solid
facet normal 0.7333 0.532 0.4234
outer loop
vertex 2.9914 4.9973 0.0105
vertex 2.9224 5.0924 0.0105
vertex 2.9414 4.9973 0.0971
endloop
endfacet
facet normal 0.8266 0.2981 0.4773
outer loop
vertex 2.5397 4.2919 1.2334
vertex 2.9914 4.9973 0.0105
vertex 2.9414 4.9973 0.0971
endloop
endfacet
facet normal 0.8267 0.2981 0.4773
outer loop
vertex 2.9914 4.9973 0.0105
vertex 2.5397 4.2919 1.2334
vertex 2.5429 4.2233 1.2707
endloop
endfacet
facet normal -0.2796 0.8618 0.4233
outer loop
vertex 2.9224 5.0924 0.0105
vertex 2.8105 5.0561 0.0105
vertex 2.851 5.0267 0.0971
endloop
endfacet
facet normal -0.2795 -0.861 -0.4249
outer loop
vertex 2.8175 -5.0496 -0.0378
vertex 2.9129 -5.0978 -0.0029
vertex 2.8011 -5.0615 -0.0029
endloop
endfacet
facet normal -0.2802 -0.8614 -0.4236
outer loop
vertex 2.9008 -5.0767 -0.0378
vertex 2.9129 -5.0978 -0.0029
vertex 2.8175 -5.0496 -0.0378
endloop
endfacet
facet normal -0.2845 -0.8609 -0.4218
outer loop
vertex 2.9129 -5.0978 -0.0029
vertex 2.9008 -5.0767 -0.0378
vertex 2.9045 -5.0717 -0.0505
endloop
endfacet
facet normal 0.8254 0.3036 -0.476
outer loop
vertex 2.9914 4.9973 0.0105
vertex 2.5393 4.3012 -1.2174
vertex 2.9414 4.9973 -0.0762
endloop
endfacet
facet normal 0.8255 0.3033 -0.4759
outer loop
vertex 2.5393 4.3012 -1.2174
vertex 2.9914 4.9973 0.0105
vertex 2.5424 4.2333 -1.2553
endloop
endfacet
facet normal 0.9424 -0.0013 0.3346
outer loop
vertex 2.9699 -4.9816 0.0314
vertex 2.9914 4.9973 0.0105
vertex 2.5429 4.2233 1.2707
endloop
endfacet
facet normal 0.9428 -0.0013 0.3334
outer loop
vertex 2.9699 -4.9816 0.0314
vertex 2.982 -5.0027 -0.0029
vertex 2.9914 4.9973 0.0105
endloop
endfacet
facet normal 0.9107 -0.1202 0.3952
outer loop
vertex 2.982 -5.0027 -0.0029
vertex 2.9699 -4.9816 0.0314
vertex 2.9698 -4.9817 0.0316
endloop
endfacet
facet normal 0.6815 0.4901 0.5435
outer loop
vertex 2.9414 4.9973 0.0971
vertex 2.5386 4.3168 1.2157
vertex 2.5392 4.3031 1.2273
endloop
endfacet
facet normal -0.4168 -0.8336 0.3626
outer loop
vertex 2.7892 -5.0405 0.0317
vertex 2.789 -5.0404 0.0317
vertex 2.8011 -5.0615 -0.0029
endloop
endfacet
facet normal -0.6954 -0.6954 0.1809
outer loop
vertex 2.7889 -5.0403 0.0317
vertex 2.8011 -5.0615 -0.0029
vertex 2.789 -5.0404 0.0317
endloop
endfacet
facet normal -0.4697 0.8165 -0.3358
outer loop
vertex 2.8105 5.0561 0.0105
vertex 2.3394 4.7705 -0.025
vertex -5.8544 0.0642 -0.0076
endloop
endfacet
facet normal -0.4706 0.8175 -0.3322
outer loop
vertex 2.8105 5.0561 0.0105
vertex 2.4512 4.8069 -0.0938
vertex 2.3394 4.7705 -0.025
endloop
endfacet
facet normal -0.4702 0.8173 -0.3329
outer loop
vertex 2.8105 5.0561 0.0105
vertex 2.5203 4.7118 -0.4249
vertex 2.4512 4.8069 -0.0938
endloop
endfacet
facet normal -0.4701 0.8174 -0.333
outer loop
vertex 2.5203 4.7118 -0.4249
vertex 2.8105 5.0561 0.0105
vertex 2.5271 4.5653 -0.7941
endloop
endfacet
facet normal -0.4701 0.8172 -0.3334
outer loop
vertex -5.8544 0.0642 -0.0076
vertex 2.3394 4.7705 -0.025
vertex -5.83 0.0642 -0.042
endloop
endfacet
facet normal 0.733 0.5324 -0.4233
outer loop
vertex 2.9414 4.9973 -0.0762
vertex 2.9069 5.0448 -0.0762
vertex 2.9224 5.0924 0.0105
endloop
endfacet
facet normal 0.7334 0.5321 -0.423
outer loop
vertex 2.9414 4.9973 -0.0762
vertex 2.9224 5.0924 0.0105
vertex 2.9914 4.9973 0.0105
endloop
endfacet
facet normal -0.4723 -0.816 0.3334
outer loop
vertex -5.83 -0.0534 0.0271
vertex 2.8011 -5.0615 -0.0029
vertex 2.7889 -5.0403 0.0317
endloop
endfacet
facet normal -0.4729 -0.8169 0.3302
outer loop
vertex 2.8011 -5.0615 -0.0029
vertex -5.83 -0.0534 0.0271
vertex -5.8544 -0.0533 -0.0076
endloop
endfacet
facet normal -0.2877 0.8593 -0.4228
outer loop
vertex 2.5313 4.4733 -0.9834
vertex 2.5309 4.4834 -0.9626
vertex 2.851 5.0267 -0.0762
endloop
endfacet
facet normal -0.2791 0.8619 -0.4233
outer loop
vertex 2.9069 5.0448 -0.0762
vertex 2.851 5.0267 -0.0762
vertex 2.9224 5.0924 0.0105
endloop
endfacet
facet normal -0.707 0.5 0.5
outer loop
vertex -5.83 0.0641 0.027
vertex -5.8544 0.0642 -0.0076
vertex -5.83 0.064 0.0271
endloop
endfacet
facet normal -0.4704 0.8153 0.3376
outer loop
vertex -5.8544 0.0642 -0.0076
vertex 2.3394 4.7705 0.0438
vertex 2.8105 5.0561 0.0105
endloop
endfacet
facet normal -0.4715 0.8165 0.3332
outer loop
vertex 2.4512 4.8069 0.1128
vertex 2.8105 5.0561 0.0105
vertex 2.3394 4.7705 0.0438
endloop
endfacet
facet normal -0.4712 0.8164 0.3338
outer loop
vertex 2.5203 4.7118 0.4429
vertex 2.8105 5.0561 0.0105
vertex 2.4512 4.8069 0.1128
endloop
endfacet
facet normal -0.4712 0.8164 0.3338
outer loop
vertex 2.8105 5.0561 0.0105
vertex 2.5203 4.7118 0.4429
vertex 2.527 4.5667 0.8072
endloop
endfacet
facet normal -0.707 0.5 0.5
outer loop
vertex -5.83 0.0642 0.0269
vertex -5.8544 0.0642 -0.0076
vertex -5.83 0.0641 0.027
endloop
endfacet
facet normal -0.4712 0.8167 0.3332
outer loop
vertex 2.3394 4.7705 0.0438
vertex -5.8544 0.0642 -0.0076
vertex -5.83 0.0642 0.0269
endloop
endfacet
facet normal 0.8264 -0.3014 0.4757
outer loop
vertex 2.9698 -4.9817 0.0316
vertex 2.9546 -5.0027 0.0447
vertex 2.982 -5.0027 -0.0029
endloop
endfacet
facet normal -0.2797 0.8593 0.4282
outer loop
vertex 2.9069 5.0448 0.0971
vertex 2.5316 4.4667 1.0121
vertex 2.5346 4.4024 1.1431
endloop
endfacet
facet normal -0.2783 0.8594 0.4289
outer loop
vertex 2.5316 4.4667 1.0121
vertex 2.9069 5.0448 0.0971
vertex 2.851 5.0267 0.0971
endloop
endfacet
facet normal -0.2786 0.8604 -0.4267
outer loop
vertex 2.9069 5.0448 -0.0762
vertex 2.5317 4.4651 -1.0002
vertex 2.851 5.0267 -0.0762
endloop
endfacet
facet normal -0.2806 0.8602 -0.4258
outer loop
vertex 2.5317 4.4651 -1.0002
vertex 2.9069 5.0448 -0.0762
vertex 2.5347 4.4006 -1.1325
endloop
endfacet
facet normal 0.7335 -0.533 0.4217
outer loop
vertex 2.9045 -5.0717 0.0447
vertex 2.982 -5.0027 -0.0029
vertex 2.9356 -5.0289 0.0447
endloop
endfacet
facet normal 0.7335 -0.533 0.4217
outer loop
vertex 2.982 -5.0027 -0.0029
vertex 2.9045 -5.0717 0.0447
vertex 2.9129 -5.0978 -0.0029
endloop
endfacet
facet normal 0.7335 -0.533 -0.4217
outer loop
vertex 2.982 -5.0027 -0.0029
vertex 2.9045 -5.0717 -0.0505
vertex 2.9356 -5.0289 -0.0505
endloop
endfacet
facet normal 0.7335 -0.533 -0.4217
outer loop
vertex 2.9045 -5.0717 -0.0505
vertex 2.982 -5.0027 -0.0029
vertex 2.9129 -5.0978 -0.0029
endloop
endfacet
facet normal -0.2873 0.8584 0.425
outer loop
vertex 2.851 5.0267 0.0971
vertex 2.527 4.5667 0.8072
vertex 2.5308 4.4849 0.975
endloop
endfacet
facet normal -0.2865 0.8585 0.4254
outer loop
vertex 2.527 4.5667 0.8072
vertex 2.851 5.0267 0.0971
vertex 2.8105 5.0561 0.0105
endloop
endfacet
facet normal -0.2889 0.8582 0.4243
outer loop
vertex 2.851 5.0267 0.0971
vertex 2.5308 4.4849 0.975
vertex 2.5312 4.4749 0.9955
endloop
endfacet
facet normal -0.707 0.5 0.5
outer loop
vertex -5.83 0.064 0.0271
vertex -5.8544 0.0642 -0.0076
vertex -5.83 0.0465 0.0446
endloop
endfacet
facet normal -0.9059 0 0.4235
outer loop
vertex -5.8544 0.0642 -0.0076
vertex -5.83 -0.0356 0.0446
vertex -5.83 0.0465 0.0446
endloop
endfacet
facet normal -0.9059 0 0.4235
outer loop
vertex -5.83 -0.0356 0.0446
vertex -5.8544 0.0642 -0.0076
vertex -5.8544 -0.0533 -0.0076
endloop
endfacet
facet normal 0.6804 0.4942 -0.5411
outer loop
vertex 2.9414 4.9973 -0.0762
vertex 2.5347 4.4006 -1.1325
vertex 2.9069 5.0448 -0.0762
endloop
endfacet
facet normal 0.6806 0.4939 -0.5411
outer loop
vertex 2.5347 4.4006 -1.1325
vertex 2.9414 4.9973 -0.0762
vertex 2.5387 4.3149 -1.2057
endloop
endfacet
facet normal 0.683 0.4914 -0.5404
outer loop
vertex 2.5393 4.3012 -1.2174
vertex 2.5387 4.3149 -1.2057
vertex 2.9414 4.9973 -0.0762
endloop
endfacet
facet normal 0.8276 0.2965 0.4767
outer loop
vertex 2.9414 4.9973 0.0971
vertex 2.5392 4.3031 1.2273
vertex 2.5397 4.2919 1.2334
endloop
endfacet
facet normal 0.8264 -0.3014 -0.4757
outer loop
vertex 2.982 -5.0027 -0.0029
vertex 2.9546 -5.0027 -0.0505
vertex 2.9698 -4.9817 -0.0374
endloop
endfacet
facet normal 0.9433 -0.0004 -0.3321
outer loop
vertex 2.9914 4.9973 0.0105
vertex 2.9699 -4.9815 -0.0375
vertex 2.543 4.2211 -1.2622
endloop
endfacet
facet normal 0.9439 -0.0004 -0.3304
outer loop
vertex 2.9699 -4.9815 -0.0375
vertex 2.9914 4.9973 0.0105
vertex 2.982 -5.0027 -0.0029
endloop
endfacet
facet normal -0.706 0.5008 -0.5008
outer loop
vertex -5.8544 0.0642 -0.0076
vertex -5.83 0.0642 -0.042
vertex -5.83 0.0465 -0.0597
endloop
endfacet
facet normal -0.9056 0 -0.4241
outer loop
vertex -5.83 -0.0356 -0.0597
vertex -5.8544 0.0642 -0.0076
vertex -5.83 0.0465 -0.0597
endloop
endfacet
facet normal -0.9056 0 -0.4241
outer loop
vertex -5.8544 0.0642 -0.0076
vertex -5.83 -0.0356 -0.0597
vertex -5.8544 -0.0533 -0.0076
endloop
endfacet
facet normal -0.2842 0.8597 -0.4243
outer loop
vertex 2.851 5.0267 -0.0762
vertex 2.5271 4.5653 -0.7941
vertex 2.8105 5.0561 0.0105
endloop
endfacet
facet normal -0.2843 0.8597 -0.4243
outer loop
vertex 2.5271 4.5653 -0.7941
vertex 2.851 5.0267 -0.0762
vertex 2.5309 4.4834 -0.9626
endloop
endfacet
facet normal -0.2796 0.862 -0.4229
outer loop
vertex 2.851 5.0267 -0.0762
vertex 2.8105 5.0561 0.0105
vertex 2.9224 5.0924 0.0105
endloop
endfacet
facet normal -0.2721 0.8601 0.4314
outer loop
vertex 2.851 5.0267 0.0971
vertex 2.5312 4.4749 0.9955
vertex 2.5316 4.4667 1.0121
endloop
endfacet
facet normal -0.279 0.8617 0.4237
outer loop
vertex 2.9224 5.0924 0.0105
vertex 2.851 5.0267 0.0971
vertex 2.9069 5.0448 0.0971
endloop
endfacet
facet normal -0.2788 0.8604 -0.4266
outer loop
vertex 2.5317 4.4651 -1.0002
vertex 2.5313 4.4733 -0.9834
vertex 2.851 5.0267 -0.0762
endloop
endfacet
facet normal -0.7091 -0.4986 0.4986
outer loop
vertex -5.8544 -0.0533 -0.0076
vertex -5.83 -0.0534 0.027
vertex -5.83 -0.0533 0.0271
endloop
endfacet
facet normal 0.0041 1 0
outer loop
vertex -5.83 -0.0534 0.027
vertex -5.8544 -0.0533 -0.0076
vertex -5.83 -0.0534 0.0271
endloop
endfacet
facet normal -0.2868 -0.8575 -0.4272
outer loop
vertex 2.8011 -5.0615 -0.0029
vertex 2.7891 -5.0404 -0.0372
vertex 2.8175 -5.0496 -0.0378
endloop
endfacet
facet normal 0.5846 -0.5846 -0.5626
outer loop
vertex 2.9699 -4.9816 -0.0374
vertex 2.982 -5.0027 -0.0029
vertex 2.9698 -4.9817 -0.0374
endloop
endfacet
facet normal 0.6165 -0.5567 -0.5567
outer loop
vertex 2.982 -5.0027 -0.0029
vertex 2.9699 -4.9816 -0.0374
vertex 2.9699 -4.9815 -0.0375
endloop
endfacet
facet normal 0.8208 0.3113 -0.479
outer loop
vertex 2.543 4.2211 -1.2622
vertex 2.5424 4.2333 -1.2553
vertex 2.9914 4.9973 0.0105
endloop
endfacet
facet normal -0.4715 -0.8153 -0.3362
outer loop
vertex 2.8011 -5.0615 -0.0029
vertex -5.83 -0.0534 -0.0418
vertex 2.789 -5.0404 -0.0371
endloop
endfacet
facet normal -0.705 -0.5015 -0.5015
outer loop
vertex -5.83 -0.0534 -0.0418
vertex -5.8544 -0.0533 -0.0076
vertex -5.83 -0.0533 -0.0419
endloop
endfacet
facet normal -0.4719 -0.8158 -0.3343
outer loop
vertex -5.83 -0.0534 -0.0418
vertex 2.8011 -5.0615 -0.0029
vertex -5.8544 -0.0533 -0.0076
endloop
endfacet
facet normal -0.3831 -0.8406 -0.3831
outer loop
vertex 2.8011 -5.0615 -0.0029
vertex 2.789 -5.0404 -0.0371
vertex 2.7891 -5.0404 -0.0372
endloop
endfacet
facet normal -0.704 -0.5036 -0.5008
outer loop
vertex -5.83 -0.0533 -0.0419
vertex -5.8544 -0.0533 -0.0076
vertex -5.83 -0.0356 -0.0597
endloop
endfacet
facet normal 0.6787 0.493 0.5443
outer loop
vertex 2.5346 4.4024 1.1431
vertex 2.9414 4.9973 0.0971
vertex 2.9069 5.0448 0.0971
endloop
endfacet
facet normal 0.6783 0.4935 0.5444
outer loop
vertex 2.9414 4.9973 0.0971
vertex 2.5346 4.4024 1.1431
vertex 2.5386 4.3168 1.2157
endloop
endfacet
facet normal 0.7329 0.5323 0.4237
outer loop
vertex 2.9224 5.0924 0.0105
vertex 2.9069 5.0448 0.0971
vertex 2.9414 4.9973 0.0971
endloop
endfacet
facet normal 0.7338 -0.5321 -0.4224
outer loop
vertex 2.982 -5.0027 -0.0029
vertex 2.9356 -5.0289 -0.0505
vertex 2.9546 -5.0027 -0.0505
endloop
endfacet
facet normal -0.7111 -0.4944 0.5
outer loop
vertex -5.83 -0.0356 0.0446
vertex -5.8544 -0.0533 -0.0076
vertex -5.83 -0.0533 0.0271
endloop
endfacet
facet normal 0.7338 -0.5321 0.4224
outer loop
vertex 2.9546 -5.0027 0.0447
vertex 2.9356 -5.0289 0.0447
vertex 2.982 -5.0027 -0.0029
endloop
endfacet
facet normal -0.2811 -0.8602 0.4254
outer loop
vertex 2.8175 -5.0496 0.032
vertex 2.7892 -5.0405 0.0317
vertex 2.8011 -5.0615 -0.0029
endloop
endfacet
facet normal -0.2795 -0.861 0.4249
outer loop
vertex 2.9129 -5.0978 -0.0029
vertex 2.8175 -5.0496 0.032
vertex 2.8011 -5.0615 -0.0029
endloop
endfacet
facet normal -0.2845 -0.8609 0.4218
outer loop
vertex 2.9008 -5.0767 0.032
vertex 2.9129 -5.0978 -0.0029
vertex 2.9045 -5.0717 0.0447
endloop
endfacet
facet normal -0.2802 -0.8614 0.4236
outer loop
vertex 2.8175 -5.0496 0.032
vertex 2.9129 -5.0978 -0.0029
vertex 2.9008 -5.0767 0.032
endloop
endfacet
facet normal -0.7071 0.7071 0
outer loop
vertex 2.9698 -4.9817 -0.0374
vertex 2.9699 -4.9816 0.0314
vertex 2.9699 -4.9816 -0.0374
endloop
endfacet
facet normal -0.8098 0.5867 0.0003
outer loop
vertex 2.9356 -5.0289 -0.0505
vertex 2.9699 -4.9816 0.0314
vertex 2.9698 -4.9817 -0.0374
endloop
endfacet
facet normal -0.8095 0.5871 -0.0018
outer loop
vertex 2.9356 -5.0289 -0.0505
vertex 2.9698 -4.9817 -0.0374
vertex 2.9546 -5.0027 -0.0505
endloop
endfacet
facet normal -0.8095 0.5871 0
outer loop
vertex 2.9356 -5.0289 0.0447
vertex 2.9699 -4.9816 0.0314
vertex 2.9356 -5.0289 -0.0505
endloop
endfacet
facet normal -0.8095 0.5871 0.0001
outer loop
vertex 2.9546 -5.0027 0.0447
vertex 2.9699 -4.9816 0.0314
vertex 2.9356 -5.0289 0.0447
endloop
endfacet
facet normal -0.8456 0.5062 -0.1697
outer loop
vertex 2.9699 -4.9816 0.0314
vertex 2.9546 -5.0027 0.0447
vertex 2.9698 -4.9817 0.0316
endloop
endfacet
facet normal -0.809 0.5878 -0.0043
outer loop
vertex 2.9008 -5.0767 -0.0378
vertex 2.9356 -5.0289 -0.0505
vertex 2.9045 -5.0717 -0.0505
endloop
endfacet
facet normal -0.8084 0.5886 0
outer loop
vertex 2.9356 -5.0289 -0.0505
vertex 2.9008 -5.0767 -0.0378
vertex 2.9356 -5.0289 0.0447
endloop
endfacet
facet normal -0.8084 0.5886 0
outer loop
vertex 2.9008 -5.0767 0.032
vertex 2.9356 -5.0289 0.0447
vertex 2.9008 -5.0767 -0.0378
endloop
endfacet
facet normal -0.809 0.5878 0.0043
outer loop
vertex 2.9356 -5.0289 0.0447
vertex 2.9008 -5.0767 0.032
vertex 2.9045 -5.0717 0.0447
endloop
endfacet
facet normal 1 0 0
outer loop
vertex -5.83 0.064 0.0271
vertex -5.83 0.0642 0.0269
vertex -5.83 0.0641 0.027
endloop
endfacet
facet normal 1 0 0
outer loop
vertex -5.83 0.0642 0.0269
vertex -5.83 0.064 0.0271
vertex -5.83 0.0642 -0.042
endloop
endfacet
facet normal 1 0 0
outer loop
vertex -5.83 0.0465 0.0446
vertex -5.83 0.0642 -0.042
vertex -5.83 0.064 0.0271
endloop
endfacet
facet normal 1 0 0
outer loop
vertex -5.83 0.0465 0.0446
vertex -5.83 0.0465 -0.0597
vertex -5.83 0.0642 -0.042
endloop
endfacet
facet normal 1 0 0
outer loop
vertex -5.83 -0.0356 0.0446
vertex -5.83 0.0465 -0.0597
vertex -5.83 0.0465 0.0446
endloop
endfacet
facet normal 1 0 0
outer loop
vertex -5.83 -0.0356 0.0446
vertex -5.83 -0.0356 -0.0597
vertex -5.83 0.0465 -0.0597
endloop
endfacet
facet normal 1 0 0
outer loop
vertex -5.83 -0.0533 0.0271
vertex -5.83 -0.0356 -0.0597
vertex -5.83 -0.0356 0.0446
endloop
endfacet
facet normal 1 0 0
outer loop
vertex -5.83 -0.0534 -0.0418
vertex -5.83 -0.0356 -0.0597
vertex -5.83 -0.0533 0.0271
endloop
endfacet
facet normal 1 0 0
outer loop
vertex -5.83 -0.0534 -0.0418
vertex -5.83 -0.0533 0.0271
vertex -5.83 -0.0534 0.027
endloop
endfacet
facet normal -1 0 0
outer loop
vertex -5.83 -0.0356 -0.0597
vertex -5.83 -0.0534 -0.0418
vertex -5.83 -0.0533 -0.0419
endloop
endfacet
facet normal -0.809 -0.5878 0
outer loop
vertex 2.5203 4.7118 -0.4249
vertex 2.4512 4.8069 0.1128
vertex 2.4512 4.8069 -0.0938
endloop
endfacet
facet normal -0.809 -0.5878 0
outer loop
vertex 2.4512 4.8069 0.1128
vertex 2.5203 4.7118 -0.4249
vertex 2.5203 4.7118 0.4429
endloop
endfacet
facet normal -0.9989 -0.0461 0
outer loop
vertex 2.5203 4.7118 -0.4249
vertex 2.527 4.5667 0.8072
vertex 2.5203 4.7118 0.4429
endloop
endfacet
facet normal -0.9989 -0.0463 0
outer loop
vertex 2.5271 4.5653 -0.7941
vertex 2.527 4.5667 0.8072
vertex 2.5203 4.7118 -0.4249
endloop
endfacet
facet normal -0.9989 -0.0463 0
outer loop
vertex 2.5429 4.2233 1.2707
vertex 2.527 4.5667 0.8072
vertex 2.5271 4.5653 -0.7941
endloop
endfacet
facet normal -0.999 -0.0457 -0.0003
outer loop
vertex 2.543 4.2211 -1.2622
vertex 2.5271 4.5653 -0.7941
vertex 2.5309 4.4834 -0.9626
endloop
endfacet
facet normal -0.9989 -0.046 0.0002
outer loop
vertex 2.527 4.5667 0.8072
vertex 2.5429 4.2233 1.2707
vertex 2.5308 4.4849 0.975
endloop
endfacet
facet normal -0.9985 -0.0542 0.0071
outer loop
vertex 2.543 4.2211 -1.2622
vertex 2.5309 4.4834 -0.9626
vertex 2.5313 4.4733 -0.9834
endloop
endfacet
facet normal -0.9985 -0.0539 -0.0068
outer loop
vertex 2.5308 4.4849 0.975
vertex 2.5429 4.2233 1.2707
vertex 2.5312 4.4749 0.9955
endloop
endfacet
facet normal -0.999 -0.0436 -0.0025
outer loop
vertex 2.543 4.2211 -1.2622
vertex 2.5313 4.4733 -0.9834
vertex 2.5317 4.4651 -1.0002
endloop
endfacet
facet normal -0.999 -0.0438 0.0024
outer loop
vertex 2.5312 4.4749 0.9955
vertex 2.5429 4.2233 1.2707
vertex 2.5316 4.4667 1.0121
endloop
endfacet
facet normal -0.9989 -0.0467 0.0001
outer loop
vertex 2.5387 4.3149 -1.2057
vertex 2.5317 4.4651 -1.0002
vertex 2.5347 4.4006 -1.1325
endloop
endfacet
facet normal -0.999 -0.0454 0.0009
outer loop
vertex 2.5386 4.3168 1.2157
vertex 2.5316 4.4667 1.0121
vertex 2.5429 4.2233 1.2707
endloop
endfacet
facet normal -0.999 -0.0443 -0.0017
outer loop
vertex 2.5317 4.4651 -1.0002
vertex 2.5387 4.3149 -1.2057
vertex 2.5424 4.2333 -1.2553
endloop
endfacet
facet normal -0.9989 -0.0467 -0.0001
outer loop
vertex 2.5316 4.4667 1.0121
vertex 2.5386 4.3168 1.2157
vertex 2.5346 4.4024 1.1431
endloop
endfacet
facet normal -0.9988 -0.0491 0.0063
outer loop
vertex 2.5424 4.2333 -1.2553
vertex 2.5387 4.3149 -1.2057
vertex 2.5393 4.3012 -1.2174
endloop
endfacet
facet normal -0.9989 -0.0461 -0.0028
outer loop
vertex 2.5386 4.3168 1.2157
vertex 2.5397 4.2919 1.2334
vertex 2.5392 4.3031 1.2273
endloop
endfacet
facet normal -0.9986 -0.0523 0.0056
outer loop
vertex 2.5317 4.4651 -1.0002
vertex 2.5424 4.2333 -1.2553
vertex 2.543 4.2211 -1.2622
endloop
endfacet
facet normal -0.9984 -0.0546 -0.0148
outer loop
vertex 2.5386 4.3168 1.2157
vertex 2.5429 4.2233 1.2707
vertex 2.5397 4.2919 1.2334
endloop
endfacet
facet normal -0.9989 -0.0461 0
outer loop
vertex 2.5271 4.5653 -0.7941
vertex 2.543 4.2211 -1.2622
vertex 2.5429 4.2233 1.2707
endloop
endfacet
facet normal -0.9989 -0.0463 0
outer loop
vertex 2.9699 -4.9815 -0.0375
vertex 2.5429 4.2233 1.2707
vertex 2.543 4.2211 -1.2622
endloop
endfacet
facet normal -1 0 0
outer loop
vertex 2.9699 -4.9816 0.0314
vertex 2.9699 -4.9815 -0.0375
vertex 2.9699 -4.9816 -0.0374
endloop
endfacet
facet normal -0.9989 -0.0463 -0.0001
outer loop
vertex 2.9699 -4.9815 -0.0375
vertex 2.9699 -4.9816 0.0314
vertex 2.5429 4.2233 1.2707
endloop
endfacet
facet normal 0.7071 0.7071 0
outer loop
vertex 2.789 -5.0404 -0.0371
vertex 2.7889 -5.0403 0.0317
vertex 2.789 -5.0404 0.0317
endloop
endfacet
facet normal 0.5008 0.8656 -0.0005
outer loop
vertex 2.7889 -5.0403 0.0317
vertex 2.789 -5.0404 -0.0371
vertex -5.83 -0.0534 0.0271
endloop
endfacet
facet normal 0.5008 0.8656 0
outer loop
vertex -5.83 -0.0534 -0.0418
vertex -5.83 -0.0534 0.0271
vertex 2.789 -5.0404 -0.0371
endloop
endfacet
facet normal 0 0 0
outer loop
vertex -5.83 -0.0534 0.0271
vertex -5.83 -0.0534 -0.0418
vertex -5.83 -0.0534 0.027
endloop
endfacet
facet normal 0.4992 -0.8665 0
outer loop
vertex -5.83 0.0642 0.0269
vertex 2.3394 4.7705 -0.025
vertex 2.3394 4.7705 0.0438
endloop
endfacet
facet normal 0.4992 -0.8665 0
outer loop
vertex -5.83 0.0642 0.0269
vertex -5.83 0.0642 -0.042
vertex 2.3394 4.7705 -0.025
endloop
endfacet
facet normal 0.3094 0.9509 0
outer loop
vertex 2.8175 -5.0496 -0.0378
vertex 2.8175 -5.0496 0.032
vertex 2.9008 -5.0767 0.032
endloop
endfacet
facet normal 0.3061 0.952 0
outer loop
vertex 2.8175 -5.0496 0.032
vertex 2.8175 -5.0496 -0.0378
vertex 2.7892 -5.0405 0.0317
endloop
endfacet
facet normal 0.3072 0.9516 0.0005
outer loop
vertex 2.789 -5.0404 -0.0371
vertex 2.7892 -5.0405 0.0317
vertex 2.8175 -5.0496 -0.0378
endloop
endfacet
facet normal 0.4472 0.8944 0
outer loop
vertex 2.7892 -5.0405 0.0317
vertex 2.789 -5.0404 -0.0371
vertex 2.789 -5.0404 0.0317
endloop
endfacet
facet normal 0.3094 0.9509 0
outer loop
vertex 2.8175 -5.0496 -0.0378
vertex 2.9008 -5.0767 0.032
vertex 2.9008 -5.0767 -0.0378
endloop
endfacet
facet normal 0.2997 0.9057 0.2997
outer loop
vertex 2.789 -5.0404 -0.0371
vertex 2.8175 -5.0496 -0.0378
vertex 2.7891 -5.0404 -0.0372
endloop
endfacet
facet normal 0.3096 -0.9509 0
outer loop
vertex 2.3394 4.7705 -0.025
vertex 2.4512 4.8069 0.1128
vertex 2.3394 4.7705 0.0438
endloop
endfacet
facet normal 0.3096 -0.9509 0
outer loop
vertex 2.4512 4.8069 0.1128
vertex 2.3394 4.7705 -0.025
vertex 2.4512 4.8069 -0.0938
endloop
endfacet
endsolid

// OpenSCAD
// Auto-generated OpenSCAD file

    inner_points = 10*[[0.1821393068757838, 0.1913870506433806, -0.766553282190714], [-0.21273894850983668, -0.20901536236239762, 0.766553282190714], [-0.5749142746609799, 0.0005416474787896391, -0.14169497283306184], [0.24202588352164686, 0.471177062130277, 0.19163832047015342], [0.2869889286882537, -0.4981611771875922, -0.0499433476370916]];

    outer_points = 10*[[-0.0010710062446377955, -0.001087881755346909, 0.8164951537673552], [0.0010710062446377955, 0.001087881755346909, -0.8164951537673552], [-0.5773495172173777, 0.0005439408776734544, -0.0007565913797176194], [0.2882045658240988, -0.5002713047271171, -0.0002885101452453076], [0.2891449513932788, 0.49972736384944366, 0.001045101524962927]];

    // Convex hull for inner set (I)
    module inner_hull() {
        hull() {
            for (p = inner_points) {
                translate(p) sphere(r=0.1);
            }
        }
    }

    // Convex hull for outer set (O) minus inner hull (O \ I)
    module outer_minus_inner() {
        difference() {
            hull() {
                for (p = outer_points) {
                    translate(p) sphere(r=0.1);
                }
            }
            inner_hull(); // Subtract inner hull
        }
    }

    // Convex hull for outer set (O) minus all translated inner hulls
    module outer_minus_AllTranslationInner() {
        difference() {
            hull() {
                for (p = outer_points) {
                    translate(p) sphere(r=0.1);
                }
            }
            hull() {
                translate([0,0,50]) inner_hull();
                translate([0,0,-50]) inner_hull();
            }; // Subtract translated inner hulls
        }
    }

    // Difference between outer_minus_inner and outer_minus_AllTranslationInner
    module outer_minus_inner_diff() {
        difference() {
            // Outer minus inner
            difference() {
                hull() {
                    for (p = outer_points) {
                        translate(p) sphere(r=0.1);
                    }
                }
                inner_hull();
            }

            // Subtract Outer minus AllTranslationInner
            difference() {
                hull() {
                    for (p = outer_points) {
                        translate(p) sphere(r=0.1);
                    }
                }
                hull() {
                    translate([0,0,50]) inner_hull();
                    translate([0,0,-50]) inner_hull();
                };
            }
        }
    }

    // Rendering all with colors applied
    color([0, 1, 0, 1]) outer_minus_AllTranslationInner(); // Opaque green
    
